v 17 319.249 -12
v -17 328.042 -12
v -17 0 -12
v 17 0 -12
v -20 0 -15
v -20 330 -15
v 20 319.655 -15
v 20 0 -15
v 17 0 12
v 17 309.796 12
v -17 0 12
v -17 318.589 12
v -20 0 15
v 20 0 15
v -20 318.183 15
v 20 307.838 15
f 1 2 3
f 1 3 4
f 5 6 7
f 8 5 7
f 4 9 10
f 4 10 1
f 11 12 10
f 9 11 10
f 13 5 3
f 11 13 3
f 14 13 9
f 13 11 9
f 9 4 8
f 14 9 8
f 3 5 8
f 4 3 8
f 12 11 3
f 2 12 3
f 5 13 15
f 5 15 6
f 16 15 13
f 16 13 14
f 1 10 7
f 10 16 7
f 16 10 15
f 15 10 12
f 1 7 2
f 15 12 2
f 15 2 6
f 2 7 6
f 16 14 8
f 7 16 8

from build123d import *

# Parameters (mm, degrees)
SKETCH1_W           = 40
SKETCH1_H           = 30
SKETCH1_W_2         = 34
SKETCH1_H_2         = 24
EXTRUDE_THIN1_DEPTH = 330
EXTRUDE1_DEPTH      = 41
EXTRUDE2_DEPTH      = 33.318373456


with BuildPart() as part:
    # Sketch1 → Extrude-Thin1 (new body)
    with BuildSketch(Plane(origin=(0, 0, 0), x_dir=(1, 0, 0), z_dir=(0, 1, 0))):
        Rectangle(SKETCH1_W, SKETCH1_H)
        Rectangle(SKETCH1_W_2, SKETCH1_H_2, mode=Mode.SUBTRACT)
    extrude(amount=EXTRUDE_THIN1_DEPTH)

    # Sketch2 → Extrude1 (cut, through all)
    with BuildSketch(Plane.ZY.offset(20)):
        Polygon((-15, 330), (15, 330), (15, 318.182685732), align=None)
    extrude(amount=-EXTRUDE1_DEPTH, mode=Mode.SUBTRACT)

    # Sketch3 → Extrude2 (cut, through all, along a direction that is not the sketch's normal)
    with BuildSketch(Plane(origin=(0, 0, -15), x_dir=(-1, 0, 0), z_dir=(0, 0, -1))):
        Polygon((20, 330), (-20, 330), (-20, 319.655296626), align=None)
    extrude(amount=-EXTRUDE2_DEPTH, dir=(0, 0.366501227, -0.930417568), mode=Mode.SUBTRACT)


solid = part.part
